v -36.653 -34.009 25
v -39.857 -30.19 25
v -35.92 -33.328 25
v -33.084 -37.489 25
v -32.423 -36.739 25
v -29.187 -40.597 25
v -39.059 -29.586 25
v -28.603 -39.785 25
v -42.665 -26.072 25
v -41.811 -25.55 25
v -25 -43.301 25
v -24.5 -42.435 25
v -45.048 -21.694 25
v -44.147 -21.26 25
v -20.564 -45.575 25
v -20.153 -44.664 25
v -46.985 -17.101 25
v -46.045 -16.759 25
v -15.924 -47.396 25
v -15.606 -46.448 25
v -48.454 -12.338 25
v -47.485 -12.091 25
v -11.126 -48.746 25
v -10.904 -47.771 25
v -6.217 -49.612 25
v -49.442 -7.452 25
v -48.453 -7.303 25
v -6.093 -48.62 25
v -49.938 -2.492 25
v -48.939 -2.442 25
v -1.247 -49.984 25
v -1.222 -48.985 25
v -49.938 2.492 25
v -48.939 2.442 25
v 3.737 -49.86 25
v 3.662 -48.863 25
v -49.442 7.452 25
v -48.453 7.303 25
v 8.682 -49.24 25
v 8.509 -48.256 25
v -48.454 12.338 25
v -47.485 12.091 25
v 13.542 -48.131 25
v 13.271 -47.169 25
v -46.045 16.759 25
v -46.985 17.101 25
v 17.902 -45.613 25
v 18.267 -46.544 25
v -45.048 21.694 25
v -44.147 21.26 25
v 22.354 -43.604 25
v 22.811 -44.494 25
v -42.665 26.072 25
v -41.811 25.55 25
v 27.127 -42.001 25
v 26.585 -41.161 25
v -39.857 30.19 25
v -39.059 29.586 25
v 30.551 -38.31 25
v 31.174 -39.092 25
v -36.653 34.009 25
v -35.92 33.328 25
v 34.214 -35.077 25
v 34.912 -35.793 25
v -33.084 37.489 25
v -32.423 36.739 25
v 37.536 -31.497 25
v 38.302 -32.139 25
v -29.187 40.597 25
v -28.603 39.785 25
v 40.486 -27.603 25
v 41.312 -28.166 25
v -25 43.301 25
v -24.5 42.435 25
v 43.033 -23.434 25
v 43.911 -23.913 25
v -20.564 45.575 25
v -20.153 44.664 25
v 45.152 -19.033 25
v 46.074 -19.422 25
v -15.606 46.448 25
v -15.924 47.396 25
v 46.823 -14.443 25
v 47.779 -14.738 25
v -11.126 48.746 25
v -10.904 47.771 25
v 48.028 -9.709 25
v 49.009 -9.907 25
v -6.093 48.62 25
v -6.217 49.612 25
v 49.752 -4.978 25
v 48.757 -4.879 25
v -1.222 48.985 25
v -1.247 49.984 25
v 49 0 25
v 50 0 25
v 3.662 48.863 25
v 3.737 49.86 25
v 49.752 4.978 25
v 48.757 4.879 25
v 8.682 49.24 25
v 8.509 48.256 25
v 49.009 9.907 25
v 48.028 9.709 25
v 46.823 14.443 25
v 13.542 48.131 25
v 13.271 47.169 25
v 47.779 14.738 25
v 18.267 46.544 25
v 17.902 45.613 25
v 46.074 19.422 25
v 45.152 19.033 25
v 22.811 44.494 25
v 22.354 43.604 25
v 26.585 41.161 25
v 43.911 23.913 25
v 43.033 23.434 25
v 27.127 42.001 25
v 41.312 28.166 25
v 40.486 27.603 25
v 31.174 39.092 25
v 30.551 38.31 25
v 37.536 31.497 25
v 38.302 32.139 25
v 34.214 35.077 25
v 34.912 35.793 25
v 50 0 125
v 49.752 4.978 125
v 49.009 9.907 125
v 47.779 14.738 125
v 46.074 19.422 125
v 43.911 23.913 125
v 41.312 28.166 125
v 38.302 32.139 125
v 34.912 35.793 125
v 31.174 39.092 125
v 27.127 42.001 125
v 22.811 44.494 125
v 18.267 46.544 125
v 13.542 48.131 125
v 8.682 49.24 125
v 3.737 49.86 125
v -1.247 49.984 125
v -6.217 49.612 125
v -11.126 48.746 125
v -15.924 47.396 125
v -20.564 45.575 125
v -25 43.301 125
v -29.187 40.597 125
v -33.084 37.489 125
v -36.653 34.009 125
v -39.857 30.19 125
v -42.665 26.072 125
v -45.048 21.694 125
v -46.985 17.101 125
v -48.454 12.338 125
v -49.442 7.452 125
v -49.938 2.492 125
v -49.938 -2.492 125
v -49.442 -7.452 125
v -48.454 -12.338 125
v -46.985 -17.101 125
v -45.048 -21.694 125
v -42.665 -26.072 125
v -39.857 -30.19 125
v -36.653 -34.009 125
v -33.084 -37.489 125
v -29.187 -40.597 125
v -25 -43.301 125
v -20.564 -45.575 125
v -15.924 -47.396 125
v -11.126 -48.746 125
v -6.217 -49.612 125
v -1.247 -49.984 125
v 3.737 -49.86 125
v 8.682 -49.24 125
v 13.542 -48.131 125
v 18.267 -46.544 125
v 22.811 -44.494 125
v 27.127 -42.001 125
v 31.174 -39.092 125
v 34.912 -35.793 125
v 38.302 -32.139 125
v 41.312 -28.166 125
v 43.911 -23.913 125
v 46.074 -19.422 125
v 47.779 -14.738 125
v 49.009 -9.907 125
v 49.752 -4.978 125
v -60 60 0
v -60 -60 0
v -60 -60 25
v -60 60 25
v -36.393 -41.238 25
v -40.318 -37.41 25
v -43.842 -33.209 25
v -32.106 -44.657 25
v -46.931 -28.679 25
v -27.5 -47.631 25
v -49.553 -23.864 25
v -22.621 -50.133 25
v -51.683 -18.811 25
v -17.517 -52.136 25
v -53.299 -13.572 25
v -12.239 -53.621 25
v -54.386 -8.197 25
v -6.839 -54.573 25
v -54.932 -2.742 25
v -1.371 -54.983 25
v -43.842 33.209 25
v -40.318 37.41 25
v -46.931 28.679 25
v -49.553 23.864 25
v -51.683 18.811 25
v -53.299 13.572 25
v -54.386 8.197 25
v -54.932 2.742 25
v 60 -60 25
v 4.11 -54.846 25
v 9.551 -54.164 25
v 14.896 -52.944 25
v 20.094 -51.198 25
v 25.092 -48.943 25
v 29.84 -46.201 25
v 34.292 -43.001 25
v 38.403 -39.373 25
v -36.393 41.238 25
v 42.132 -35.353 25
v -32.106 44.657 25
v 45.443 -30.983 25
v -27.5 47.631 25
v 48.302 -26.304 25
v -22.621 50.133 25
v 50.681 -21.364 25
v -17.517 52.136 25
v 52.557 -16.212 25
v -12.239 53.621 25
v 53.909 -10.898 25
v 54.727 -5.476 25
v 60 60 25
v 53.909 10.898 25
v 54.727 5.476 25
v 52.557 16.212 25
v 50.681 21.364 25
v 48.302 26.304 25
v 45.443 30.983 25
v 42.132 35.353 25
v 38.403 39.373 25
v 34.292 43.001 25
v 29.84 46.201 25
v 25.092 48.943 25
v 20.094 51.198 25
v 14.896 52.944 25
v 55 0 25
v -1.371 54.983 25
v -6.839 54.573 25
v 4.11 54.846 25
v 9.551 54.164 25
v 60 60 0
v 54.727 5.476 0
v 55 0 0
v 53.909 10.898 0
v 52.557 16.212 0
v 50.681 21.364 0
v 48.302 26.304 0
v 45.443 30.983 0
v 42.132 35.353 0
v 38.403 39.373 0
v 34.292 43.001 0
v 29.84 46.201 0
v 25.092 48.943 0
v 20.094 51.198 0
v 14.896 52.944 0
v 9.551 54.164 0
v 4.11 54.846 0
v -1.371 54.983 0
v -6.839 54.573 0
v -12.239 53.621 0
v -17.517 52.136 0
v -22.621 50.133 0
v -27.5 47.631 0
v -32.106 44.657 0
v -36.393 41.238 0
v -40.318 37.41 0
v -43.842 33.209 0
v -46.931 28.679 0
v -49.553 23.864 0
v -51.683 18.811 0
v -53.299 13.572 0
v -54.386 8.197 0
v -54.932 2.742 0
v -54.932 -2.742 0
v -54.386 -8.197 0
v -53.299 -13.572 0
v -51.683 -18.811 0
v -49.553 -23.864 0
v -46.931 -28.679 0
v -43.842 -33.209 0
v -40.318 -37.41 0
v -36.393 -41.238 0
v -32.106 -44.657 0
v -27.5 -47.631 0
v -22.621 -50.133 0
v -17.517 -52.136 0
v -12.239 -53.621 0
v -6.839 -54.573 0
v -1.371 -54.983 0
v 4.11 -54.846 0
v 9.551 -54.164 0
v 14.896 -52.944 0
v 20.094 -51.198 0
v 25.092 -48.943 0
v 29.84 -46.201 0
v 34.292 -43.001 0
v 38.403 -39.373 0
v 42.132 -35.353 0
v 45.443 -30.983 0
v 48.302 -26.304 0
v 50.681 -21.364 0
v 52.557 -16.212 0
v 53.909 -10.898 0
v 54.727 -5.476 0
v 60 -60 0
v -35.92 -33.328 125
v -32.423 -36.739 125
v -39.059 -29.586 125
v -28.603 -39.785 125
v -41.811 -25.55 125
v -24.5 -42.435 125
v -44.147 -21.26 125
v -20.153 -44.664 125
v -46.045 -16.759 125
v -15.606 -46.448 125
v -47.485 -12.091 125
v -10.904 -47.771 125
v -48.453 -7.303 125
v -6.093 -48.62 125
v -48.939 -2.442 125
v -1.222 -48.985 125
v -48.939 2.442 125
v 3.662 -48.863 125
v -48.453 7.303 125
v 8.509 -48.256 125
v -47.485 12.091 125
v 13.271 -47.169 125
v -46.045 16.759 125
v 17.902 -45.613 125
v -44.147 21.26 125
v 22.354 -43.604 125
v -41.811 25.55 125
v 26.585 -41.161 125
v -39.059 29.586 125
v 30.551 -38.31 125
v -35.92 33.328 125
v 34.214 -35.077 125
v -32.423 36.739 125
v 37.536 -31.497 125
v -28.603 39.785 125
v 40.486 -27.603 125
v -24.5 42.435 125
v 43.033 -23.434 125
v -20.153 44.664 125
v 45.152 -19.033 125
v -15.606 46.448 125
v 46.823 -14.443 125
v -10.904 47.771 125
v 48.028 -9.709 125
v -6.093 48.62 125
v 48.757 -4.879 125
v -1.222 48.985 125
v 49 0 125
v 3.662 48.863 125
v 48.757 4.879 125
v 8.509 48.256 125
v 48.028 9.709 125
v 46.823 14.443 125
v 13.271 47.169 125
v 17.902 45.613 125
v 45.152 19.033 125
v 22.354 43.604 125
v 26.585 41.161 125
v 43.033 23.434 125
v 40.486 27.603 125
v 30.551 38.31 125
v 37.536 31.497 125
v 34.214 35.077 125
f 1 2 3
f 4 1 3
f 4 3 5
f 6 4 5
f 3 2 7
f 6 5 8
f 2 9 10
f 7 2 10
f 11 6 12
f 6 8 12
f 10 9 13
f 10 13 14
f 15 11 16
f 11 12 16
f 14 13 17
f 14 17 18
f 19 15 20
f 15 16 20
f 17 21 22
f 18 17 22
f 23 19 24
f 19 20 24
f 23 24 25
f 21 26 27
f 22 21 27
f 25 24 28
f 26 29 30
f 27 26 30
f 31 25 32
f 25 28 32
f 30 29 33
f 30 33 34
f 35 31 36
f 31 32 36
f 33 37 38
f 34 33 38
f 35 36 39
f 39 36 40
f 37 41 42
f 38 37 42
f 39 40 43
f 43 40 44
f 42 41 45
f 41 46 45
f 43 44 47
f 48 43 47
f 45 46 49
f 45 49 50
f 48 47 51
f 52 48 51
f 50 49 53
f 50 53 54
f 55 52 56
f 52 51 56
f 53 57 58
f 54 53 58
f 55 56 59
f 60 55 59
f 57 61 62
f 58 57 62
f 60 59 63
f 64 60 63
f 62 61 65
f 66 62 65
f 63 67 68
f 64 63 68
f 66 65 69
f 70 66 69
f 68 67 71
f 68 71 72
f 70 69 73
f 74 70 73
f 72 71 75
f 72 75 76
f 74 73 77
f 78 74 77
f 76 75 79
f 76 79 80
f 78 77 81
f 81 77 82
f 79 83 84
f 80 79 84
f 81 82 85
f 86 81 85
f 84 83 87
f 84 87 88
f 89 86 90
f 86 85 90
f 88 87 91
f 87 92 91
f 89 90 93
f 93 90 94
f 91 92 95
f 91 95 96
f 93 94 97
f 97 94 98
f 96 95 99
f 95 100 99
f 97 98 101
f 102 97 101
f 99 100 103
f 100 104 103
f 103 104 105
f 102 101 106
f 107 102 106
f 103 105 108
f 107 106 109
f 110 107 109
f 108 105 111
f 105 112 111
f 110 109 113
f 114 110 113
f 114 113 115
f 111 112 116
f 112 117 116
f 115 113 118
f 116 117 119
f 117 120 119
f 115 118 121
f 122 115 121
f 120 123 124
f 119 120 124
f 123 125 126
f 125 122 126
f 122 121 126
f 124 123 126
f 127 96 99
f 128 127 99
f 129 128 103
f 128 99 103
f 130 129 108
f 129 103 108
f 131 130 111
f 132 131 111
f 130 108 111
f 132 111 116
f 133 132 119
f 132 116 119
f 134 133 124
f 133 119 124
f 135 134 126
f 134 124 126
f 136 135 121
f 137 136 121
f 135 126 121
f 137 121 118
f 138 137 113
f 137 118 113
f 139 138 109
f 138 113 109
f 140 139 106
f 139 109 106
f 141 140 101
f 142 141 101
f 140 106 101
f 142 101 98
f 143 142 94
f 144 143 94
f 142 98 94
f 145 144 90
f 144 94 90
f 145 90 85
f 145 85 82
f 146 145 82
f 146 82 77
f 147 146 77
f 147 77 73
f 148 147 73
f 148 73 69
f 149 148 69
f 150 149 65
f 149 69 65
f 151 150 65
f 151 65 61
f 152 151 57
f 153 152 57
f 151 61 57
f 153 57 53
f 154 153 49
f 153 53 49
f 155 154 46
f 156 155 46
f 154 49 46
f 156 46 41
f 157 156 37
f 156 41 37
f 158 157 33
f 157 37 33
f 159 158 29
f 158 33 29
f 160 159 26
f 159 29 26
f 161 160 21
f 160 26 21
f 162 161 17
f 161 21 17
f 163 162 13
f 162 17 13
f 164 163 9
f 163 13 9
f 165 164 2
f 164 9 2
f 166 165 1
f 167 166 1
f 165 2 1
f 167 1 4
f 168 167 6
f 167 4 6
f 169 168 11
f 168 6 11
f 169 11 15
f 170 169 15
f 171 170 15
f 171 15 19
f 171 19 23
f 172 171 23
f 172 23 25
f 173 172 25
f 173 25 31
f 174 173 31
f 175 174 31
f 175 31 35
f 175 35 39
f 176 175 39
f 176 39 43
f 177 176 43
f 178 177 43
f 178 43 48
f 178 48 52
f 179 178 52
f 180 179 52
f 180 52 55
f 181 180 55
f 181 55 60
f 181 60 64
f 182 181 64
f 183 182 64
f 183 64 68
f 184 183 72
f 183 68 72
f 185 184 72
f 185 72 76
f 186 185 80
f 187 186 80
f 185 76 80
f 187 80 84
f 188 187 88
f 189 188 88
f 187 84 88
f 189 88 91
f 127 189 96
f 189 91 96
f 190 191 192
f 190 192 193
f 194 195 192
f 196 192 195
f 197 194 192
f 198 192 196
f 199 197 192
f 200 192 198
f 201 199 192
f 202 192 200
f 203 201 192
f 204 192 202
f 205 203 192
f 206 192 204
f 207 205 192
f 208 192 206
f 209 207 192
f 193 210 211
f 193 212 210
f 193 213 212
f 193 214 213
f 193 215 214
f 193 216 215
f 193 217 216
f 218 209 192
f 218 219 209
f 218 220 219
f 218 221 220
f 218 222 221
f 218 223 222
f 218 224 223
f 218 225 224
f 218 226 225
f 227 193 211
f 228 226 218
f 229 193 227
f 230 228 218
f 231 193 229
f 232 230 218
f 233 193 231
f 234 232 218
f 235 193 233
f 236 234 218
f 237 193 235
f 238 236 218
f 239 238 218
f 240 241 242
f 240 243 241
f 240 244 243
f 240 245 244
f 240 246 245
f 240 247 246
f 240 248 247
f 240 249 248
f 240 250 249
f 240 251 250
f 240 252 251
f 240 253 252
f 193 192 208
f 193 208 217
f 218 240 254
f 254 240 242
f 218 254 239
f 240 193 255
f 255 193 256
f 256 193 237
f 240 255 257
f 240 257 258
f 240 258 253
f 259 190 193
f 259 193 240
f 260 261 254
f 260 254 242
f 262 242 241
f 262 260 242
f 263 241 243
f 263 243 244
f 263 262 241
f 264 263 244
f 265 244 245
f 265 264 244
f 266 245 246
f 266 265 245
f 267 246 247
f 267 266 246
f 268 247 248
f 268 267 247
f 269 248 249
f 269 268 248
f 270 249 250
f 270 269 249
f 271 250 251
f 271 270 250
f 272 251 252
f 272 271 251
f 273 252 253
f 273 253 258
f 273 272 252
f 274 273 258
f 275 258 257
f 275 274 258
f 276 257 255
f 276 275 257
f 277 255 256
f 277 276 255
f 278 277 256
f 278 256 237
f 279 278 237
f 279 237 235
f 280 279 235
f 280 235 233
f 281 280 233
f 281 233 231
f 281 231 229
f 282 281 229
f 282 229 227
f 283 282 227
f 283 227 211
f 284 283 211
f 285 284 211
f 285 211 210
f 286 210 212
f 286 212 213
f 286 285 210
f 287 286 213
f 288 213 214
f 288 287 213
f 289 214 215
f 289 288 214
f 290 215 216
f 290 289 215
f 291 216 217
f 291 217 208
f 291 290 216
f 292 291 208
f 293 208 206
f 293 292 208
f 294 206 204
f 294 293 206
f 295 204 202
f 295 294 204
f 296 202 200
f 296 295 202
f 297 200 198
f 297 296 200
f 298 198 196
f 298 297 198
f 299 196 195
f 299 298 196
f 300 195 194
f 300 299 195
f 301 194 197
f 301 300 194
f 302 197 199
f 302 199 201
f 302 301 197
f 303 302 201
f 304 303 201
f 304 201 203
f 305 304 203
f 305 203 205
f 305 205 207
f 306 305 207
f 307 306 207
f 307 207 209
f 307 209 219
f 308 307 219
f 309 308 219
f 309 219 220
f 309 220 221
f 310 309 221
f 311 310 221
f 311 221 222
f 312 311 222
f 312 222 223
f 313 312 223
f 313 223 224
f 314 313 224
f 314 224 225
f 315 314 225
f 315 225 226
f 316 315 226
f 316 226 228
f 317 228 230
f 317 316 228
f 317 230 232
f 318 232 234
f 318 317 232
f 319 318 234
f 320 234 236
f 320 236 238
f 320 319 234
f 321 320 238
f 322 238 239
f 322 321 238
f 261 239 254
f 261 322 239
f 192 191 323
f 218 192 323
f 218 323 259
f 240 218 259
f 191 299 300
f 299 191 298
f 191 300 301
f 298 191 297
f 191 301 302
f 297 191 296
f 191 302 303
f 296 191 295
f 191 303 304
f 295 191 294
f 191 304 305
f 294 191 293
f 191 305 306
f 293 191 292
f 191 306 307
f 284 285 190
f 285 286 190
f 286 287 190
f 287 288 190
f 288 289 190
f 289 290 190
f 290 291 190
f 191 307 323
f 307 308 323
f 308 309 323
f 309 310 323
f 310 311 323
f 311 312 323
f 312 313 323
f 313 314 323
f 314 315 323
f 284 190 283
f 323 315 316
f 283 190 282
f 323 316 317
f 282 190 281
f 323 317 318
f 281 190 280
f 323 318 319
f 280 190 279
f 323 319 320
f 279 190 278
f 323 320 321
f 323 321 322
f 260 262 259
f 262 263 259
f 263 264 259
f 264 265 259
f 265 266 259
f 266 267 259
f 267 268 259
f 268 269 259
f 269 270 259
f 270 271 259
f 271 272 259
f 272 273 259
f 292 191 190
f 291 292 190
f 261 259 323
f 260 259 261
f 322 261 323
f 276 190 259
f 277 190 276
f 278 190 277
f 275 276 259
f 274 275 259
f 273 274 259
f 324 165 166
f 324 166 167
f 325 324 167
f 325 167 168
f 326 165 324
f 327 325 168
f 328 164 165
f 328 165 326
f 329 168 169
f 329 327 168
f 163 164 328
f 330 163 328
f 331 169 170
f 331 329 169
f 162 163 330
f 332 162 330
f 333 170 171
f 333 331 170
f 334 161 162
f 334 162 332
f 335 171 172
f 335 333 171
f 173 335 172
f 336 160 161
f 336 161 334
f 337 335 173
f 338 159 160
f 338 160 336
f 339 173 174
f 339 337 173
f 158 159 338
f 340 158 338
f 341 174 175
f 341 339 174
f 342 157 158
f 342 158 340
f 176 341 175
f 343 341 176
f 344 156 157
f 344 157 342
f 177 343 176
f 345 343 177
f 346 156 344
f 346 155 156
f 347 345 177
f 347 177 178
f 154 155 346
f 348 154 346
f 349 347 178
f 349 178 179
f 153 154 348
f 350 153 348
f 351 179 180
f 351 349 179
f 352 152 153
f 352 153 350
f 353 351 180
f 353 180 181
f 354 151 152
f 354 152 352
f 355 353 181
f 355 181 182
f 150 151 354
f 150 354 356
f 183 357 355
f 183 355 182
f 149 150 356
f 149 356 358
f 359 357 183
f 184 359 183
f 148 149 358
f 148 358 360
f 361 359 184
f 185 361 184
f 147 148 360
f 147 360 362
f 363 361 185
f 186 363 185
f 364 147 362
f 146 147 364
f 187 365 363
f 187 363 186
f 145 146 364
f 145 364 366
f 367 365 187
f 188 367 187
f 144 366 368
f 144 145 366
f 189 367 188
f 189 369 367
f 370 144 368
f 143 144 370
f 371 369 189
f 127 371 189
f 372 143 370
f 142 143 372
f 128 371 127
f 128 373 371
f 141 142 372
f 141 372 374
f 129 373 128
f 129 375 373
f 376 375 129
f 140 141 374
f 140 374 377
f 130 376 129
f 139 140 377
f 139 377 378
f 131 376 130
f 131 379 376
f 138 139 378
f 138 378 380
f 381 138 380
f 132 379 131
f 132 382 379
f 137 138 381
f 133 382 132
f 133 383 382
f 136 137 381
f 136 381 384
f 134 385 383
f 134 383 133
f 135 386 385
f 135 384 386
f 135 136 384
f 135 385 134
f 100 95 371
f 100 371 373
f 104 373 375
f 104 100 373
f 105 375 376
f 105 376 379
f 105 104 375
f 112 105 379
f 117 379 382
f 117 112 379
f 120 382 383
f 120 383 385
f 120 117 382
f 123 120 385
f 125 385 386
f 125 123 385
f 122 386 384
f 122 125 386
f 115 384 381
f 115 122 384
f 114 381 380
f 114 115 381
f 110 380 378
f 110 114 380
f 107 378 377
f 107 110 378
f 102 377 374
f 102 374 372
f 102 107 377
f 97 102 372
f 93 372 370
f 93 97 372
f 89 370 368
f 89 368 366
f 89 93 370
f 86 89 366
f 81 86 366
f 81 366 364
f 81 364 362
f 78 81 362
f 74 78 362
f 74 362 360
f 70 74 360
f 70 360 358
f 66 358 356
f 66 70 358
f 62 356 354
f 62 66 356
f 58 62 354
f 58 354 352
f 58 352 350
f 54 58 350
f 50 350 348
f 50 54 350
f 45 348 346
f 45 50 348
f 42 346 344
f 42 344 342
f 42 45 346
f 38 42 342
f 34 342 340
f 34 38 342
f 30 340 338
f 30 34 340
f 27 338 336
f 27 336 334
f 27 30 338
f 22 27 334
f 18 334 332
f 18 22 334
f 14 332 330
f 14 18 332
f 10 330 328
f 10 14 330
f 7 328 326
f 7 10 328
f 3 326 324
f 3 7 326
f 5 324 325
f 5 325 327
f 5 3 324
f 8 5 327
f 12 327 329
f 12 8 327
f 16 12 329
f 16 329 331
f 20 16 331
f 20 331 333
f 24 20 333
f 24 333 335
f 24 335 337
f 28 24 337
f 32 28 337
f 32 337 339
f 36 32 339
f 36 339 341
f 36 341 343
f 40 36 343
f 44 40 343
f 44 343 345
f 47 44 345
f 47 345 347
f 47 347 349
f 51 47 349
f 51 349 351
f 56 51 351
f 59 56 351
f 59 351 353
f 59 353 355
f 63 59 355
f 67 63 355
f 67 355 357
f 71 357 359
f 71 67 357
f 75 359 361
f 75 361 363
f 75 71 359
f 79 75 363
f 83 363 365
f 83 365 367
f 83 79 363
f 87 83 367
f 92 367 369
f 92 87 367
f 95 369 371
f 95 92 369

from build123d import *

# Parameters (mm, degrees)
F0_W     = 120
F0_H     = 120
F0_R     = 55
F1_DEPTH = 25
F2_R     = 50
F2_R_2   = 49
F3_DEPTH = 100


with BuildPart() as f1:
    # F0 (on Top) → F1 (new body)
    with BuildSketch(Plane.XY):
        Rectangle(F0_W, F0_H)
        Circle(F0_R, mode=Mode.SUBTRACT)
    extrude(amount=F1_DEPTH)


with BuildPart() as f3:
    # F2 (on face) → F3 (new body)
    with BuildSketch(Plane.XY.offset(25)):
        Circle(F2_R)
        Circle(F2_R_2, mode=Mode.SUBTRACT)
    extrude(amount=F3_DEPTH)


solid = Compound([f1.part, f3.part])
